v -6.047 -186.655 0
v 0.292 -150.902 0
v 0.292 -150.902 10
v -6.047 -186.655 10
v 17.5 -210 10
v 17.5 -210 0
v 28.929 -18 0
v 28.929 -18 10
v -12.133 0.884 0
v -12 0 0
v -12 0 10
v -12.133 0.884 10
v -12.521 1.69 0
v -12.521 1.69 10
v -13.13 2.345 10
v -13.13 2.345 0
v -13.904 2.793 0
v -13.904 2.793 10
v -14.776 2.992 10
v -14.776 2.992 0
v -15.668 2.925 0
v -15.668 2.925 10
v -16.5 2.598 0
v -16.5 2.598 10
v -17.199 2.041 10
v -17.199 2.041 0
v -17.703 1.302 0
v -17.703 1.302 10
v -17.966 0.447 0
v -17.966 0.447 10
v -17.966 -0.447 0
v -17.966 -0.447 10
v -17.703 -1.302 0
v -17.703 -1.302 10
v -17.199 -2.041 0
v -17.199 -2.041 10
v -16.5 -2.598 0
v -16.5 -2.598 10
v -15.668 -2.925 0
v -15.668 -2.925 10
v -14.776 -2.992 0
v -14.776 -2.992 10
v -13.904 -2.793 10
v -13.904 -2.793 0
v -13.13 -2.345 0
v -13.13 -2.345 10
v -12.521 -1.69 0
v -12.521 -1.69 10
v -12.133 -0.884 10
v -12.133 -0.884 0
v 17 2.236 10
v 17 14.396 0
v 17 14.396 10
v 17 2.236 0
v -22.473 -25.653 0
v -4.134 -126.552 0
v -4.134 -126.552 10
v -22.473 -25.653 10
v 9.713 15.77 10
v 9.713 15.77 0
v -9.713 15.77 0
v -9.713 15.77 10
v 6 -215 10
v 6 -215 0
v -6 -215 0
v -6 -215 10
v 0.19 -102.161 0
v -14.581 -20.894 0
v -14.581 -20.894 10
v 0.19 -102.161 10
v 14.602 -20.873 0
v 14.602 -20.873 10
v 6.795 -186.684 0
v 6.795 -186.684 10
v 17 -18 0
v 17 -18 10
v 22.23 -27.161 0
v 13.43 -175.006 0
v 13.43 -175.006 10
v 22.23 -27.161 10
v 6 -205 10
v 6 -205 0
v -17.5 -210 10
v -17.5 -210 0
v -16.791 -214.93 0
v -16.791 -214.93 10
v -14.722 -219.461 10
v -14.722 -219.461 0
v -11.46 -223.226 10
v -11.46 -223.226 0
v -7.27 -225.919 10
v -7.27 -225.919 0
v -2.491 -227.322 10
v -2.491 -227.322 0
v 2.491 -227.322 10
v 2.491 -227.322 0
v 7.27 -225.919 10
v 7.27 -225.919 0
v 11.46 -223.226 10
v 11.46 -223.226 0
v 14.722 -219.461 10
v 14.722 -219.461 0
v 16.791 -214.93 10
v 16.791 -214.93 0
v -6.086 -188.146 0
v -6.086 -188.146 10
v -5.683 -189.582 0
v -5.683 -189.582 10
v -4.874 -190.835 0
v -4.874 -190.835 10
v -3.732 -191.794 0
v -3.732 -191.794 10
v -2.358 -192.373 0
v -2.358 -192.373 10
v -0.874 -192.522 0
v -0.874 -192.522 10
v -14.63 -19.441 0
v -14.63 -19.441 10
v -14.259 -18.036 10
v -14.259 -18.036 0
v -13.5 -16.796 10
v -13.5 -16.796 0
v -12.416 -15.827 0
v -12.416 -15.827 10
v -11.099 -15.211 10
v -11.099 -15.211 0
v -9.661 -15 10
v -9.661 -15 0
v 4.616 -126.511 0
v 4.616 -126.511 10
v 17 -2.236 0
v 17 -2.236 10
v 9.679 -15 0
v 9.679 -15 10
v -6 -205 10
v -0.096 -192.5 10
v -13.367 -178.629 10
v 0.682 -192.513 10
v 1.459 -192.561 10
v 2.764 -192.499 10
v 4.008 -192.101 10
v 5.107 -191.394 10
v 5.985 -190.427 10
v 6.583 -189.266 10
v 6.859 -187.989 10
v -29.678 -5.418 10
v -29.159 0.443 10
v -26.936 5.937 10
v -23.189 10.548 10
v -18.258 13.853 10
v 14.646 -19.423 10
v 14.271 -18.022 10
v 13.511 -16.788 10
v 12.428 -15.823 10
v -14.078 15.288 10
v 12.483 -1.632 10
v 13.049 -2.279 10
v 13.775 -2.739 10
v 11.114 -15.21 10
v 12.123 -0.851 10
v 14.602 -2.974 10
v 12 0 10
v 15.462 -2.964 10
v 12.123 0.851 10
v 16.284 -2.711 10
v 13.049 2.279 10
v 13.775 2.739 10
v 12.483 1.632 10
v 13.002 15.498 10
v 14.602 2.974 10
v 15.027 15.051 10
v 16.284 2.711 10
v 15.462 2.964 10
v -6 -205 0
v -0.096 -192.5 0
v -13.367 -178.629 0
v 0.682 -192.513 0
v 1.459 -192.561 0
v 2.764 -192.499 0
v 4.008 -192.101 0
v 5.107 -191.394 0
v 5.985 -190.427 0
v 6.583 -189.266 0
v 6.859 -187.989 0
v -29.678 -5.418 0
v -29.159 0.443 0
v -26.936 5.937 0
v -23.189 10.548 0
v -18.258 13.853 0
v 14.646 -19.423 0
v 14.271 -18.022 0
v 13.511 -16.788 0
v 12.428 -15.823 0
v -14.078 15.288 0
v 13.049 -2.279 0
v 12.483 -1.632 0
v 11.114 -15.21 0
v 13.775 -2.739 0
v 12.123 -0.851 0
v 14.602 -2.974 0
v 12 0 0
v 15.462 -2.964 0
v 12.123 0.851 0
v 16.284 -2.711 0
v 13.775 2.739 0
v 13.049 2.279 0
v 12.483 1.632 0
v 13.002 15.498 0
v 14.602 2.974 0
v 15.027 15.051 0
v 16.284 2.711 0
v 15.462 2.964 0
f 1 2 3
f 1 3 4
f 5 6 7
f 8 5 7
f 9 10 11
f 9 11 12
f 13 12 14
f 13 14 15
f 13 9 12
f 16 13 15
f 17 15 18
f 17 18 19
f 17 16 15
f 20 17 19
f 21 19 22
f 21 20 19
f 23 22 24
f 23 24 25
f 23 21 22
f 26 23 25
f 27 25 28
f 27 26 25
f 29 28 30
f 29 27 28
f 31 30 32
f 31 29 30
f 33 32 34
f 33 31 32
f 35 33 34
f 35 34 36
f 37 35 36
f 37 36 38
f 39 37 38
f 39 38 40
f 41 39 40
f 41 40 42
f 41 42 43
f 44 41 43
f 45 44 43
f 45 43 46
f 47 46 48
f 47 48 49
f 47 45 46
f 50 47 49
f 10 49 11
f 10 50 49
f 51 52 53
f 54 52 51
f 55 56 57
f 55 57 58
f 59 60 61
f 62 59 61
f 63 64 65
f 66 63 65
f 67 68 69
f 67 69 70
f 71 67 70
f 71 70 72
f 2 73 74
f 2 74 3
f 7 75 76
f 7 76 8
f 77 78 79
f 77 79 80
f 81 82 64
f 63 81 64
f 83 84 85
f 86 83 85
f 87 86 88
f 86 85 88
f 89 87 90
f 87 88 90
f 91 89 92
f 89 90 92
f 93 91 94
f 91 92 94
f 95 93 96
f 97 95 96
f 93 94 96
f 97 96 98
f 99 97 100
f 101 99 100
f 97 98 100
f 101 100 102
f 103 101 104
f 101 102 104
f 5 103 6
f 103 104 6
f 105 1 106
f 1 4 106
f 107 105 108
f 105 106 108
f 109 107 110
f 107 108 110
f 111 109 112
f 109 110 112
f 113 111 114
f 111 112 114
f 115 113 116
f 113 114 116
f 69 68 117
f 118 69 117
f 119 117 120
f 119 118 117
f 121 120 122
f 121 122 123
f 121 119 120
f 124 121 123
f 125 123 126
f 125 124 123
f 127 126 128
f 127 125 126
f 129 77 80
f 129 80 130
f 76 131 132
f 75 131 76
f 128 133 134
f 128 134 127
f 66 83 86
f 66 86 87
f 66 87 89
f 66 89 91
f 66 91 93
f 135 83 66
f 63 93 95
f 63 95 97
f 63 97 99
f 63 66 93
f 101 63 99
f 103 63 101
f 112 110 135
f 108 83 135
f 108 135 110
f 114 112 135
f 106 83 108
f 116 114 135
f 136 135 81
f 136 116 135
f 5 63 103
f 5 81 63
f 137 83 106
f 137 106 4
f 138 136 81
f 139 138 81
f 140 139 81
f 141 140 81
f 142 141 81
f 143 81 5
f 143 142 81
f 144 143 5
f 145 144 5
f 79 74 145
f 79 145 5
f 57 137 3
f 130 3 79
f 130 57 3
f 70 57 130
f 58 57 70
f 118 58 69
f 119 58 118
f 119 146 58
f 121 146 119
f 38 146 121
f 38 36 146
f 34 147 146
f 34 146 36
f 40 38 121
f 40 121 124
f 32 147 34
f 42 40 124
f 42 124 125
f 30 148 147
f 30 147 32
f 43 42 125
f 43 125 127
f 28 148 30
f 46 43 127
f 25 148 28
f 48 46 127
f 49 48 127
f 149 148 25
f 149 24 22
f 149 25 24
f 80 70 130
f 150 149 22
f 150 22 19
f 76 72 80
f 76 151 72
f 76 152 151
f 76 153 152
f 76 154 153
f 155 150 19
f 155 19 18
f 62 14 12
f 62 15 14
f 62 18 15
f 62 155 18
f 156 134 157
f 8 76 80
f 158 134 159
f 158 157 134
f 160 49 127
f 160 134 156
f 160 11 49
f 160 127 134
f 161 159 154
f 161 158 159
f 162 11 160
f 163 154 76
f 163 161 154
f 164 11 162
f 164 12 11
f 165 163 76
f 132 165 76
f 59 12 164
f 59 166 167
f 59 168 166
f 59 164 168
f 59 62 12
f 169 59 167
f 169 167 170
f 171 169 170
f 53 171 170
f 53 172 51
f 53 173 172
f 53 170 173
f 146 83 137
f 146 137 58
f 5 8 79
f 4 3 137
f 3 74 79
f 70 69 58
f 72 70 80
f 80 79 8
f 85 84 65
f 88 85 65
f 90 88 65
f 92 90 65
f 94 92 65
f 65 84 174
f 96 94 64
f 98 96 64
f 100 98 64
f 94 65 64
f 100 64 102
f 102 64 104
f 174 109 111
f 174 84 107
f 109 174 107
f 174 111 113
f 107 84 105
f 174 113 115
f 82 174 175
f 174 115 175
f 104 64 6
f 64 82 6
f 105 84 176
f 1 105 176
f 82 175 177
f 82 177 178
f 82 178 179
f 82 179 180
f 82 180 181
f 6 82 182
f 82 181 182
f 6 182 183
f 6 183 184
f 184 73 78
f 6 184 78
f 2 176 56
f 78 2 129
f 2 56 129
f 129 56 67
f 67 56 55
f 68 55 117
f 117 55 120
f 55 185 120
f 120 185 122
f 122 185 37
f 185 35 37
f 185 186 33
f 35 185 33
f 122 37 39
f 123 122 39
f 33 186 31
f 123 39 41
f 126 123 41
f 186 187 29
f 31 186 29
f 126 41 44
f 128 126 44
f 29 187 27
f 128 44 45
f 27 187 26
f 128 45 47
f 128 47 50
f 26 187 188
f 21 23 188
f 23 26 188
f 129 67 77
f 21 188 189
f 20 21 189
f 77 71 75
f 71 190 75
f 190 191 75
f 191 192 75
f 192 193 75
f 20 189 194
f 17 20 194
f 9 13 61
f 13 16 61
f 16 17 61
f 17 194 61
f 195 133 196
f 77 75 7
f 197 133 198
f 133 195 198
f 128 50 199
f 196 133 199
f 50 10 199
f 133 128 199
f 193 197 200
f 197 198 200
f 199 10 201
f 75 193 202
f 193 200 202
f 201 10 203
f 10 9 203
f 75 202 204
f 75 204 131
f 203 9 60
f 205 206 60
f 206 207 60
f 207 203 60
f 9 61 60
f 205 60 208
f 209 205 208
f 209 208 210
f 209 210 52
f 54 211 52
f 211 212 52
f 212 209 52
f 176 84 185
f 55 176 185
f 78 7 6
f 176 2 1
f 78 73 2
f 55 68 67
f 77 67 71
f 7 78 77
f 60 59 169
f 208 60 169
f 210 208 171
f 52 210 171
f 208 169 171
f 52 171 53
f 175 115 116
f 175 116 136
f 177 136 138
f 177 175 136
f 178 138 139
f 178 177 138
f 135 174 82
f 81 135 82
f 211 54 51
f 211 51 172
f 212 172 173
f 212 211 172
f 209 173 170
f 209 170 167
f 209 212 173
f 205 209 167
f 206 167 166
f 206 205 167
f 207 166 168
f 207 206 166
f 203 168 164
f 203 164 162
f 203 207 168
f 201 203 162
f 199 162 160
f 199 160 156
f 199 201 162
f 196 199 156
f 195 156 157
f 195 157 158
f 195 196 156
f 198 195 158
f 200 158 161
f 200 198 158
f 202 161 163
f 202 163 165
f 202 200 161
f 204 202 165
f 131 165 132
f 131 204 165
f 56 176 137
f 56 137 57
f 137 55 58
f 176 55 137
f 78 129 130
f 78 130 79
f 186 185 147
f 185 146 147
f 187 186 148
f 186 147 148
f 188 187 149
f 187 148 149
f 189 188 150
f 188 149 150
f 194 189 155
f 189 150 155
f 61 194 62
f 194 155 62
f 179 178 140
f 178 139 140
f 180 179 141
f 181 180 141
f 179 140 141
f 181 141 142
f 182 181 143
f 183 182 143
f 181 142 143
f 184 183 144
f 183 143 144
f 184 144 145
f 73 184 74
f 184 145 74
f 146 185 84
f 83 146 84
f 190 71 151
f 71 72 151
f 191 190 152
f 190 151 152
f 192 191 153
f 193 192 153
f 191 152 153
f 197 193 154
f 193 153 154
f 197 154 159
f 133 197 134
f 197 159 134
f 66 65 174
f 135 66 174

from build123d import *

# Parameters (mm, degrees)
SKETCH1_R           = 3
BOSS_EXTRUDE2_DEPTH = 10
FILLET1_R           = 20
FILLET2_R           = 20
CUT_EXTRUDE1_START  = -10
CUT_EXTRUDE1_DEPTH  = 10
FILLET3_R           = 5
CUT_EXTRUDE4_START  = -10
CUT_EXTRUDE4_DEPTH  = 10


with BuildPart() as part:
    # Sketch1 → Boss-Extrude2 (new body)
    with BuildSketch(Plane.XY):
        with BuildLine():
            Line((-30, 15.770412854), (-30, 0))
            Line((-30, 0), (-17.5, -210))
            ThreePointArc((-17.5, -210), (0, -227.5), (17.5, -210))
            Line((17.5, -210), (30, 0))
            Line((30, 0), (30, 15.770412854))
            Line((30, 15.770412854), (-30, 15.770412854))
        make_face()
        with Locations((-15, 0)):
            Circle(SKETCH1_R, mode=Mode.SUBTRACT)
        with Locations((15, 0)):
            Circle(SKETCH1_R, mode=Mode.SUBTRACT)
        Polygon((0, -205), (6, -205), (6, -215), (-6, -215), (-6, -205), align=None, mode=Mode.SUBTRACT)
    extrude(amount=BOSS_EXTRUDE2_DEPTH)

    # Fillet1
    fillet1_edges = [part.edges().sort_by_distance(p)[0] for p in [
        (-30, 15.770412854, 5),
    ]]
    fillet(fillet1_edges, radius=FILLET1_R)

    # Fillet2
    fillet2_edges = [part.edges().sort_by_distance(p)[0] for p in [
        (30, 15.770412854, 5),
    ]]
    fillet(fillet2_edges, radius=FILLET2_R)

    # Sketch4 → Cut-Extrude1 (cut)
    with BuildSketch(Plane.XY.offset(10).offset(CUT_EXTRUDE1_START)):
        Polygon((-15.651797422, -15), (0.190220551, -102.160979768), (15.643622882, -15), (15, -15), align=None)
        Polygon((-22.473027071, -25.6531452), (-13.367328465, -178.628881795), (-4.134156204, -126.551525408), align=None)
        Polygon((22.230419841, -27.161313899), (4.615986353, -126.511039477), (13.430162671, -175.005634359), align=None)
        with BuildLine():
            Line((0.291609598, -150.901585116), (-7.372445375, -194.128735111))
            ThreePointArc((-7.372445375, -194.128735111), (0.476576628, -192.506490497), (8.225632191, -194.553674383))
            Line((8.225632191, -194.553674383), (0.291609598, -150.901585116))
        make_face()
    extrude(amount=CUT_EXTRUDE1_DEPTH, mode=Mode.SUBTRACT)

    # Fillet3
    fillet3_edges = [part.edges().sort_by_distance(p)[0] for p in [
        (8.225632191, -194.553674383, 5),
        (-7.372445375, -194.128735111, 5),
        (-15.651797422, -15, 5),
        (15.643622882, -15, 5),
    ]]
    fillet(fillet3_edges, radius=FILLET3_R)

    # Sketch5 → Cut-Extrude4 (cut)
    with BuildSketch(Plane.XY.offset(10).offset(CUT_EXTRUDE4_START)):
        with BuildLine():
            Line((29.260488635, 0), (18, 0))
            ThreePointArc((18, 0), (17.738612788, -1.224744871), (17, -2.236067977))
            Line((17, -2.236067977), (17, -18))
            Line((17, -18), (28.928571429, -18))
            Line((28.928571429, -18), (29.677502384, -5.417959945))
            ThreePointArc((29.677502384, -5.417959945), (29.653859351, -2.694751229), (29.260488635, 0))
        make_face()
        with BuildLine():
            ThreePointArc((17, 2.236067977), (17.738612788, 1.224744871), (18, 0))
            Line((18, 0), (29.260488635, 0))
            ThreePointArc((29.260488635, 0), (24.938968919, 8.738256866), (17, 14.39559177))
            Line((17, 14.39559177), (17, 2.236067977))
        make_face()
    extrude(amount=CUT_EXTRUDE4_DEPTH, mode=Mode.SUBTRACT)


solid = part.part
